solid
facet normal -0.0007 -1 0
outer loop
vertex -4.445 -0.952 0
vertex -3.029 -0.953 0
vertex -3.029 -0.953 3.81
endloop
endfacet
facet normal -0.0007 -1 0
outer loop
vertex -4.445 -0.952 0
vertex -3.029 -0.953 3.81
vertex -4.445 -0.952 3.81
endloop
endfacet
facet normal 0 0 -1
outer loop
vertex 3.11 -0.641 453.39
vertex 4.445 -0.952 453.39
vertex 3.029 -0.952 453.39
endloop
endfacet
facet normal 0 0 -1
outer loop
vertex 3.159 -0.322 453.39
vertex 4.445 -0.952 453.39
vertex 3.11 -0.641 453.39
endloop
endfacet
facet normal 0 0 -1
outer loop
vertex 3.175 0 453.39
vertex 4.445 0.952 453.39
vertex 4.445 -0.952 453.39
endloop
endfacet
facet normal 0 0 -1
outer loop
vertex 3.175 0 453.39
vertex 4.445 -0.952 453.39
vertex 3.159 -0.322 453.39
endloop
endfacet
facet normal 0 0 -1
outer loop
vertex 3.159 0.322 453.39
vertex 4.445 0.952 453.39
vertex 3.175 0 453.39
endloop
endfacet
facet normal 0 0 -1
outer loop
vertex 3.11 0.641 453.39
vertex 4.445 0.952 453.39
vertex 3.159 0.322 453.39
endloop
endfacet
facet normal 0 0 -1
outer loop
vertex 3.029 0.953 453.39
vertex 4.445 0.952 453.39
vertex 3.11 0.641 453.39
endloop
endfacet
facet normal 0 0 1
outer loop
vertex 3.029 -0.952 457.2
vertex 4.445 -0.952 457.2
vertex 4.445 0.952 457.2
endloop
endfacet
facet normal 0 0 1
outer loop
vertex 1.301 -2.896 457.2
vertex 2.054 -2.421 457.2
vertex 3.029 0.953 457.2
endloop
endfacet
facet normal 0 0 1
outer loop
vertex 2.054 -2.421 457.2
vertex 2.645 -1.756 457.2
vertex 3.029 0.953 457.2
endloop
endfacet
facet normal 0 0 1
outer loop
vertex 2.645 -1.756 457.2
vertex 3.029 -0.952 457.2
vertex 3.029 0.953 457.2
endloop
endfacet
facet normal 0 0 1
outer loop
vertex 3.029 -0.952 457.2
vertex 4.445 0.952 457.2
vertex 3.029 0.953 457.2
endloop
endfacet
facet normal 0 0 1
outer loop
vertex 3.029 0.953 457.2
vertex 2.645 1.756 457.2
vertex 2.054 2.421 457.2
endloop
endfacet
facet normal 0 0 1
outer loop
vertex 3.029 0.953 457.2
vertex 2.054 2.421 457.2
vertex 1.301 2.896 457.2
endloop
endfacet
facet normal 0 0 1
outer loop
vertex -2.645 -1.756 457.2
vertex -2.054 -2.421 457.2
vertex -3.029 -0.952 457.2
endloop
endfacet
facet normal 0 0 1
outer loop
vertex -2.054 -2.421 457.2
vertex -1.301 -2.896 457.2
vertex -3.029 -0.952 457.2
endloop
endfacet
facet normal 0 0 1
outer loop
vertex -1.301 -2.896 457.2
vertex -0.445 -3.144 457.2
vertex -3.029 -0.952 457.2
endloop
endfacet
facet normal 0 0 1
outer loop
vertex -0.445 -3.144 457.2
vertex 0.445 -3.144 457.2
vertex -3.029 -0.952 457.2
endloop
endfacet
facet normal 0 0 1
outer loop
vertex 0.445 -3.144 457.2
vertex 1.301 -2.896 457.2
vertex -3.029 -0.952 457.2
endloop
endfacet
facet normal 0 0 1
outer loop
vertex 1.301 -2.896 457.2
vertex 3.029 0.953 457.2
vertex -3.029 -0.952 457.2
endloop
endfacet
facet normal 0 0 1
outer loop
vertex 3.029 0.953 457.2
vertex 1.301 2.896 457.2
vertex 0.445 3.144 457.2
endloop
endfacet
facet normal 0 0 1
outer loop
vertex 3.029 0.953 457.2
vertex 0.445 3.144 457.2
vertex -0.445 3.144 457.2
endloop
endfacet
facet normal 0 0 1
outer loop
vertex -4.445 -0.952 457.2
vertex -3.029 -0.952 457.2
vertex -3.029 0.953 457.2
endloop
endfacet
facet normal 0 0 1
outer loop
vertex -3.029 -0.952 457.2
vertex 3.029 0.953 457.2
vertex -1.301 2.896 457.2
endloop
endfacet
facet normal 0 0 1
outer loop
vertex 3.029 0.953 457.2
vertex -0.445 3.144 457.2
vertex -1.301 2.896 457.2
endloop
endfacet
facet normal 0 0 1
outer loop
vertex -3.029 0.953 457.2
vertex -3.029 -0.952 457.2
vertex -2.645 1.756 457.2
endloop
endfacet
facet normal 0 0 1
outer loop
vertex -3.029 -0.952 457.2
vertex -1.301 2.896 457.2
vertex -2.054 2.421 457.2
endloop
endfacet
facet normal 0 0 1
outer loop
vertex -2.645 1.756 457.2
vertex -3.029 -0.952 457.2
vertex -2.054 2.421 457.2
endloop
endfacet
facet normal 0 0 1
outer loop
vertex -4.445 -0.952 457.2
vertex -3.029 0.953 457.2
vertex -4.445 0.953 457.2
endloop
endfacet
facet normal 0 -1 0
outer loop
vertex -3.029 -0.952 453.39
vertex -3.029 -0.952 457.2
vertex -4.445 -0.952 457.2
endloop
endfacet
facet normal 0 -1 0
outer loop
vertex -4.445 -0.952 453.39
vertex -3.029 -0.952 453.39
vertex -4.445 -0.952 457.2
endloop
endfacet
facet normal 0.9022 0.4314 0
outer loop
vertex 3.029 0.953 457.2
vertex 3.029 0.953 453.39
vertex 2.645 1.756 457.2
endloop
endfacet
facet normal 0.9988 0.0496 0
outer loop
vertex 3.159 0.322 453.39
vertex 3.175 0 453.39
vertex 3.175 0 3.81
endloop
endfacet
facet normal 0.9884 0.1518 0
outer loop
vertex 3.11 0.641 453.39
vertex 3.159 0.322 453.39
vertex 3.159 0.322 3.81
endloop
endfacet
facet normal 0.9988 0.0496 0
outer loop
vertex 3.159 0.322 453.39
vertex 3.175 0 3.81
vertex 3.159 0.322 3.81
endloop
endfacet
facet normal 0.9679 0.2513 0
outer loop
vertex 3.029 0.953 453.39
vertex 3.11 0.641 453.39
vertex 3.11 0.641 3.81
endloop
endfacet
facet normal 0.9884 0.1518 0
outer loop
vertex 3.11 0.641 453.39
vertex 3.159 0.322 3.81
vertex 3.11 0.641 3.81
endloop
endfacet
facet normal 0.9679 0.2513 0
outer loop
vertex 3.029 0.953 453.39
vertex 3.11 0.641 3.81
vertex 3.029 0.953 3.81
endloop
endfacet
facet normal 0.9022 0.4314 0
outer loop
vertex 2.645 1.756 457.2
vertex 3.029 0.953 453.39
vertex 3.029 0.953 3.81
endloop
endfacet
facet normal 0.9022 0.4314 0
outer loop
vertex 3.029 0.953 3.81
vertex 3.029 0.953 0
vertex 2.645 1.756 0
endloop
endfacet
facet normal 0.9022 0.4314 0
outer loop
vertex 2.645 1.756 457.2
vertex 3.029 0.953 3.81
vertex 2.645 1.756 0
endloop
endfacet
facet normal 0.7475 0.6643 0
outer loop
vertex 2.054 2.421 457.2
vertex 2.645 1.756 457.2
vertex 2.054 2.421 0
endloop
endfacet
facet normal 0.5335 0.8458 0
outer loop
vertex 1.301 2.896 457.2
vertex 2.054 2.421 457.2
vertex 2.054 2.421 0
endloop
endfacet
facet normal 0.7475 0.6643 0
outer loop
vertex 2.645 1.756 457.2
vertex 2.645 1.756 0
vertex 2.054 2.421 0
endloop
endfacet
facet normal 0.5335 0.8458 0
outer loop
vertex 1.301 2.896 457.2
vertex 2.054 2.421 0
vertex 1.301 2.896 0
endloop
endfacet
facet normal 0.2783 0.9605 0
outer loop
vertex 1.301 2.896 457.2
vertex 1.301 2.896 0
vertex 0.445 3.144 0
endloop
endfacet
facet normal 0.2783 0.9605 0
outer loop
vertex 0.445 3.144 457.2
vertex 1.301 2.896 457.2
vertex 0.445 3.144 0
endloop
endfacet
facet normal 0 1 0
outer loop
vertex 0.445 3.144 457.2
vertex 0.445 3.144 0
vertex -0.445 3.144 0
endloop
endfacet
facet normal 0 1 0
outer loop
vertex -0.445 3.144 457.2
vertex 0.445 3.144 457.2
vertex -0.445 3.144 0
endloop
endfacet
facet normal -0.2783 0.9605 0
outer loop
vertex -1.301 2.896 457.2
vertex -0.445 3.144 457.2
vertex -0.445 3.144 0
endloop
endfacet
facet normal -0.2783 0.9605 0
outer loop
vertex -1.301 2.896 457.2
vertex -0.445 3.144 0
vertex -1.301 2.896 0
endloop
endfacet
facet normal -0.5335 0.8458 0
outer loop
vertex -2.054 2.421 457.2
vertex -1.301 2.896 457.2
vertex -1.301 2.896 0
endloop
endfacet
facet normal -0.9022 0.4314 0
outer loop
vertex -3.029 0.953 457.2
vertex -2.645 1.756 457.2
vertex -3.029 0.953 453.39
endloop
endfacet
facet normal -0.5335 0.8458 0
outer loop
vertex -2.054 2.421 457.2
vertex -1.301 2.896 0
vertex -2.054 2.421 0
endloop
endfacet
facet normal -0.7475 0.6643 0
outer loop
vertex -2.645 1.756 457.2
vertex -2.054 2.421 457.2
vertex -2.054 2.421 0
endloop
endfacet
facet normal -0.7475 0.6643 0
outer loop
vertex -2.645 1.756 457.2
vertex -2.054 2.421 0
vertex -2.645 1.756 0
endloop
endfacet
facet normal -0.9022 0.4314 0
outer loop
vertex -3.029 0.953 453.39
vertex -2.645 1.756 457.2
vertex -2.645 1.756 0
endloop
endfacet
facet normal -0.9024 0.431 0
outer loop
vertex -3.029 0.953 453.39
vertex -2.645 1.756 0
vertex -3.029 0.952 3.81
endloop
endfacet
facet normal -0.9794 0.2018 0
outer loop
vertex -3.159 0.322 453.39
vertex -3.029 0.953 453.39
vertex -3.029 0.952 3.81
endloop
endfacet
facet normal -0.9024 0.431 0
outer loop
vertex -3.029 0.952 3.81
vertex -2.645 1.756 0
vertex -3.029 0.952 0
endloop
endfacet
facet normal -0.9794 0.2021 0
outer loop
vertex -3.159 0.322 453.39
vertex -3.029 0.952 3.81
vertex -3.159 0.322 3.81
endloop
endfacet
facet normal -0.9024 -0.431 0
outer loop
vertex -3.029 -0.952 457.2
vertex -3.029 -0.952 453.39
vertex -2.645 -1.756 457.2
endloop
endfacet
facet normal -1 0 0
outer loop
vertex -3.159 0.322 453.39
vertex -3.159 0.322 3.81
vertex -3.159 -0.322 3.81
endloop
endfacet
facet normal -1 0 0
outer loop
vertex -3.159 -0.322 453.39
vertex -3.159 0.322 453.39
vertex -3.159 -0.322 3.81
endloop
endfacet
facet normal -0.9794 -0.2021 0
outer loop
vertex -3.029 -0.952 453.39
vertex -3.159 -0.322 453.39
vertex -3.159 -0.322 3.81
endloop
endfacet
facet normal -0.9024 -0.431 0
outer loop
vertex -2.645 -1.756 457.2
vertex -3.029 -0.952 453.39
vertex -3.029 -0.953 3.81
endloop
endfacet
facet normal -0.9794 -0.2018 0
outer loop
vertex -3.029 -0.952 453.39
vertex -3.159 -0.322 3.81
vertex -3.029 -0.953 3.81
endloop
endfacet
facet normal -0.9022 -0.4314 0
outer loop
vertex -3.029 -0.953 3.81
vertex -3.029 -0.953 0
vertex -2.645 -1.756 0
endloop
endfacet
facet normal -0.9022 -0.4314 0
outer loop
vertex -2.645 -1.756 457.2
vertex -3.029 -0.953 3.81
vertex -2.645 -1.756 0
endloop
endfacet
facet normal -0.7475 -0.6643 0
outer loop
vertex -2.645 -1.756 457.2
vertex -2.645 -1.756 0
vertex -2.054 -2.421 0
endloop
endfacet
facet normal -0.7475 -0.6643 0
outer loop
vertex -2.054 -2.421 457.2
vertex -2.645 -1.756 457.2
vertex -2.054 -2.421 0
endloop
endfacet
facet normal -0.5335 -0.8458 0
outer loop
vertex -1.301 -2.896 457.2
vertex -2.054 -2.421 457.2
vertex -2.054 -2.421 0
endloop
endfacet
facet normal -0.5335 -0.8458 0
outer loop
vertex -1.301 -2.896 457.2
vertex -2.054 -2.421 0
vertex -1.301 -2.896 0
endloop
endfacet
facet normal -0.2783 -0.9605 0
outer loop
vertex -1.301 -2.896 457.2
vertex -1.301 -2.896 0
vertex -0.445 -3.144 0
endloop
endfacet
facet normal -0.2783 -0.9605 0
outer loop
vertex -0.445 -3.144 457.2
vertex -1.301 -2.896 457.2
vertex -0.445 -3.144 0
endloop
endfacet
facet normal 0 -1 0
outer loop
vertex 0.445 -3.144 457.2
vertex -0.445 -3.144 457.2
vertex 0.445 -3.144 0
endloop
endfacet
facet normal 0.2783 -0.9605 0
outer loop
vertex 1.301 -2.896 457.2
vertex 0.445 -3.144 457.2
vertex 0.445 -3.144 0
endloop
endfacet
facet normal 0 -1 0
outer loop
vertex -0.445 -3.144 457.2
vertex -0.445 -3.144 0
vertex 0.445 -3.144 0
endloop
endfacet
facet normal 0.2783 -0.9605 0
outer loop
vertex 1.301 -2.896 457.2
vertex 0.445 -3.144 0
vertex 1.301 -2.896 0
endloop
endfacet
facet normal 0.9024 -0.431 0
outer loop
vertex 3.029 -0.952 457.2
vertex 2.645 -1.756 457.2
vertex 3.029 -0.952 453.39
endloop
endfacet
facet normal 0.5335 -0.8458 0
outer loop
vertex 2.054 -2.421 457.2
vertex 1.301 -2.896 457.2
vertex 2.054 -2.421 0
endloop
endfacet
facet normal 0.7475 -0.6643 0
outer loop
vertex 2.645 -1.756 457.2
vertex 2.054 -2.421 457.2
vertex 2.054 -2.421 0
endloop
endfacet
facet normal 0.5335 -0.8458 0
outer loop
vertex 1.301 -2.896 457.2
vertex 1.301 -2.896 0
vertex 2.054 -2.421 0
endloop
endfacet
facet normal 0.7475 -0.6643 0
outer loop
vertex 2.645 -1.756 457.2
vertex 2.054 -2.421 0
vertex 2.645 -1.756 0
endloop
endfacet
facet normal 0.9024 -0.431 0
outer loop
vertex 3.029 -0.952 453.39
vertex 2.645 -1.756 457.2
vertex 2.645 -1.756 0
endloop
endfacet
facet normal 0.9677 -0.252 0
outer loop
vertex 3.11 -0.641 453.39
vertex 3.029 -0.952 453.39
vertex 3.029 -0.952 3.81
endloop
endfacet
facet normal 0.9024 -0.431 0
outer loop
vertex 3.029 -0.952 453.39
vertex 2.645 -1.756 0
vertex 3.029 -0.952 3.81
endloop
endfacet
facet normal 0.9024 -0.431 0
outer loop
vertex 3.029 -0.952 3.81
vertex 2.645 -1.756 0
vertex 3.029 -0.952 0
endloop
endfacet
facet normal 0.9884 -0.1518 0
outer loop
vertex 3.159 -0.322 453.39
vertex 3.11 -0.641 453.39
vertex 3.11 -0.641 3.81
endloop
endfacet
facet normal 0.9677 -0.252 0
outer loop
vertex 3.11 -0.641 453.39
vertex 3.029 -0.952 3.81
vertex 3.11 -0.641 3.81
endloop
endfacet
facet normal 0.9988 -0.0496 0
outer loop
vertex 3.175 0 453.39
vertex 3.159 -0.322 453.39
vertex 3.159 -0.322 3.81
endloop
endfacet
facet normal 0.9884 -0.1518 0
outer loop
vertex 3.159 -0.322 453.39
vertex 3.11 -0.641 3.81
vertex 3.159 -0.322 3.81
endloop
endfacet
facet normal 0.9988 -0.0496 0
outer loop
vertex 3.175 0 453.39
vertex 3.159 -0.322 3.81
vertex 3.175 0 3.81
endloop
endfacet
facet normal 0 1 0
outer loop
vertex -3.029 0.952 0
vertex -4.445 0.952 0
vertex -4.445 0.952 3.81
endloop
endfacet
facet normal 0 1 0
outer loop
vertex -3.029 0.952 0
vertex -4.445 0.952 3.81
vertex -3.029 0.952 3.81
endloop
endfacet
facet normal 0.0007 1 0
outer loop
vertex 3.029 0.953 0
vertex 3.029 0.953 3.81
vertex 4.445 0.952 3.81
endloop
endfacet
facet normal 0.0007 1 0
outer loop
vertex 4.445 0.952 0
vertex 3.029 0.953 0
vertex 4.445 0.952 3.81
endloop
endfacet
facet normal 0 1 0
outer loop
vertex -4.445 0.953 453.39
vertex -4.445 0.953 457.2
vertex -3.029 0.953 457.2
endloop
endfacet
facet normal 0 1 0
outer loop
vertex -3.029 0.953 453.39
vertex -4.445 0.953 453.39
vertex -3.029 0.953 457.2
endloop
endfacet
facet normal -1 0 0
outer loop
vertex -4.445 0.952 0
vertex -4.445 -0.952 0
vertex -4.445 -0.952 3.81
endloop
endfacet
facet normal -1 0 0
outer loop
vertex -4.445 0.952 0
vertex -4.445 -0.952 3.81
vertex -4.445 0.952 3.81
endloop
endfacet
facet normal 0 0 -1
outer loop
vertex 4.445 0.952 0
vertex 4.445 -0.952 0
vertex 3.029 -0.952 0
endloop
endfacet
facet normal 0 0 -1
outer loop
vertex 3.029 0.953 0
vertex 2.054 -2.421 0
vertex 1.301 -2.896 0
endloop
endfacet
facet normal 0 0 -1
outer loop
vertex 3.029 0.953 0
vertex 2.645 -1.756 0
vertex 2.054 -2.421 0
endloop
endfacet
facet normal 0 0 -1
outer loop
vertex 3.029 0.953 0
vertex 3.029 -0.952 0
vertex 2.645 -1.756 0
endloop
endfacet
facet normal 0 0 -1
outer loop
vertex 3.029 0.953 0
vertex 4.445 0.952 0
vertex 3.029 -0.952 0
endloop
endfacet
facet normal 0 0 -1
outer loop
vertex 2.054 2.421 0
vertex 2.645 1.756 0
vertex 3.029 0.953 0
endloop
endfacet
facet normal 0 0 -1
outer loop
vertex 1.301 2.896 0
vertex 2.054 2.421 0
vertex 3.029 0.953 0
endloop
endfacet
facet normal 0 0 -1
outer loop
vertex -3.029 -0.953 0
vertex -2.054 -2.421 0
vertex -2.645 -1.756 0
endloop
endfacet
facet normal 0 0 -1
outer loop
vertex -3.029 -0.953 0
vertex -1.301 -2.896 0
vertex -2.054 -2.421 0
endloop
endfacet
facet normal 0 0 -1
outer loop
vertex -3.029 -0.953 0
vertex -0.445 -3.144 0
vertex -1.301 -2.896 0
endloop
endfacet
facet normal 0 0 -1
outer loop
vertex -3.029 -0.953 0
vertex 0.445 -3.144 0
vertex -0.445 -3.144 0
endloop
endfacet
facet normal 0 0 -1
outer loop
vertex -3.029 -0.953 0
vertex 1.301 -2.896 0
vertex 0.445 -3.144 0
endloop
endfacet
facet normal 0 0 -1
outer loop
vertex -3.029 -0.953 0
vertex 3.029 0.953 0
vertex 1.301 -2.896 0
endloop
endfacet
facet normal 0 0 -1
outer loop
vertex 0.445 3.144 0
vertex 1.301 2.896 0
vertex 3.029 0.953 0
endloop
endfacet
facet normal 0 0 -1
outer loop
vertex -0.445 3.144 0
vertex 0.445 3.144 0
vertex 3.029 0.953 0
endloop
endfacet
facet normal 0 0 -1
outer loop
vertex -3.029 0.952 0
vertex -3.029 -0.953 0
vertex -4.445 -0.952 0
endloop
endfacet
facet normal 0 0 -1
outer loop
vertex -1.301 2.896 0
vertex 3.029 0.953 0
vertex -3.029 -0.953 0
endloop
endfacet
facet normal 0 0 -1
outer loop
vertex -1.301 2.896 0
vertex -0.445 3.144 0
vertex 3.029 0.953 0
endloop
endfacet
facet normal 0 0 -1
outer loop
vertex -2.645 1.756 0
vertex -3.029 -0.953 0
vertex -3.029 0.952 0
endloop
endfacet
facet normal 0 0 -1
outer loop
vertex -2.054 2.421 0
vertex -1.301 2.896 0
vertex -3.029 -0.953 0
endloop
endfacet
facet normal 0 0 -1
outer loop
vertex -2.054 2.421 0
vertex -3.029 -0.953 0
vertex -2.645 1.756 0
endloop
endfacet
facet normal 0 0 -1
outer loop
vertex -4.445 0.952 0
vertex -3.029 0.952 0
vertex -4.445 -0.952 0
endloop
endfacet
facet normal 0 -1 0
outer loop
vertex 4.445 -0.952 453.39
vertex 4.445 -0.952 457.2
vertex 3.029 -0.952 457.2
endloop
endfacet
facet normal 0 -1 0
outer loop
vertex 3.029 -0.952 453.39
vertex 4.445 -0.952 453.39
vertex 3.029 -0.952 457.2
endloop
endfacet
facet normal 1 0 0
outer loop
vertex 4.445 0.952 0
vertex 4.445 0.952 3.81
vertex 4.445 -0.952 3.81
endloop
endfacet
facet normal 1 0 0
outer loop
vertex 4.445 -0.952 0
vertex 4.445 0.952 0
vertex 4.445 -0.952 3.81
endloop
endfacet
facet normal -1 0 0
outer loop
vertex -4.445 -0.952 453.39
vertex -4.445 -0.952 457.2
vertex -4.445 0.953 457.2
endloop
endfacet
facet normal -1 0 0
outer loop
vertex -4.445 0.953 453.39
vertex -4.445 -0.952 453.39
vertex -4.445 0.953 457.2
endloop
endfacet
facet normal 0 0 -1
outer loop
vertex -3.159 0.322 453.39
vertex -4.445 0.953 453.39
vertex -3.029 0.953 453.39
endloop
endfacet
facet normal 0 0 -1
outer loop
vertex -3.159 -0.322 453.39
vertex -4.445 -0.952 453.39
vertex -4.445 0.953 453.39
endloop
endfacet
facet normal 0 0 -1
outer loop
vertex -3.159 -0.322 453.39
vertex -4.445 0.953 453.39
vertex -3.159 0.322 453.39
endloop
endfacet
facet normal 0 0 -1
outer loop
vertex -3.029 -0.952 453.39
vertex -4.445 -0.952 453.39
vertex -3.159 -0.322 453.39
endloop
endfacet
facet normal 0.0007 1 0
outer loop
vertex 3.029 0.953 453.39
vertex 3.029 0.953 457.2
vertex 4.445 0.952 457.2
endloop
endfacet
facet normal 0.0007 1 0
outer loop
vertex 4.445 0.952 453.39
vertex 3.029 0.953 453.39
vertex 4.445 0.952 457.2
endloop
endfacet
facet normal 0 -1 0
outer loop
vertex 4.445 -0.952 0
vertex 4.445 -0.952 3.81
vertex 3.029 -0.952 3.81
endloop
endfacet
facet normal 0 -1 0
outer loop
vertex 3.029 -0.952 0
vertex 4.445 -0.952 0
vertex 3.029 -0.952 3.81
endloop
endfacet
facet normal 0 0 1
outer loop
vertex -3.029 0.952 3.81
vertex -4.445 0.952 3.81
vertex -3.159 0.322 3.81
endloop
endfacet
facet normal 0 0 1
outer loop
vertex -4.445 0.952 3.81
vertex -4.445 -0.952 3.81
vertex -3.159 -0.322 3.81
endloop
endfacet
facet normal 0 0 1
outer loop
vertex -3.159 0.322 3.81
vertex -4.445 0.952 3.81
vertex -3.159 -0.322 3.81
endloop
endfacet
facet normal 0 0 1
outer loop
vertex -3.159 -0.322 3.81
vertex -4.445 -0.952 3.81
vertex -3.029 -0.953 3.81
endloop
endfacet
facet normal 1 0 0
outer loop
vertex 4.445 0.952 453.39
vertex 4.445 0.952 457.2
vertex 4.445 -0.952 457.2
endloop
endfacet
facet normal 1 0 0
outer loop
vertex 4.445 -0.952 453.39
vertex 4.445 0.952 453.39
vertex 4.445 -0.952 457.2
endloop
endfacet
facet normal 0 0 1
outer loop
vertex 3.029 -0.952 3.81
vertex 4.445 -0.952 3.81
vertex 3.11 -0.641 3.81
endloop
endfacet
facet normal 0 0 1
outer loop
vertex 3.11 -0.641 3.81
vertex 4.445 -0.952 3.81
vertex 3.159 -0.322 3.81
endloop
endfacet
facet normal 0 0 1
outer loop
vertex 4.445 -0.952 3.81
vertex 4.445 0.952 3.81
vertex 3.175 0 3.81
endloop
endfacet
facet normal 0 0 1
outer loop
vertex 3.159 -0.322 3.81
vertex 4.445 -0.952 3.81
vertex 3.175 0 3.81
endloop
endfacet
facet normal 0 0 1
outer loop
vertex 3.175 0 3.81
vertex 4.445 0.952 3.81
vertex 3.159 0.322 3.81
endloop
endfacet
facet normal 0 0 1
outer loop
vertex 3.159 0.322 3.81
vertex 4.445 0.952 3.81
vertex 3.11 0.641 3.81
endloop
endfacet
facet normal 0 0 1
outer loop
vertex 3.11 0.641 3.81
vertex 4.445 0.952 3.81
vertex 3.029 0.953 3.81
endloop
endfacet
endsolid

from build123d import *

# Parameters (mm, degrees)
SKETCH1_R              = 3.175
BOSS_EXTRUDE1_DEPTH    = 457.2
BOSS_EXTRUDE2_START    = -3.81
BOSS_EXTRUDE2_DEPTH    = 3.81
CIRPATTERN1_COUNT      = 2
LPATTERN1_COUNT        = 2
LPATTERN1_PITCH        = 453.39
LPATTERN1_START        = -3.81
LPATTERN1_COPY_1_DEPTH = 3.81


with BuildPart() as part:
    # Sketch1 → Boss-Extrude1 (new body)
    with BuildSketch(Plane.XY):
        Circle(SKETCH1_R)
    extrude(amount=BOSS_EXTRUDE1_DEPTH)

    # Sketch3 → Boss-Extrude2 (add)
    with BuildSketch(Plane.XY.offset(457.2).offset(BOSS_EXTRUDE2_START)):
        with BuildLine():
            Line((4.445, 0.9525), (4.445, -0.9525))
            Line((4.445, -0.9525), (3.028756964, -0.9525))
            ThreePointArc((3.028756964, -0.9525), (3.175, 0), (3.028756964, 0.9525))
            Line((3.028756964, 0.9525), (4.445, 0.9525))
        make_face()
    boss_extrude2 = extrude(amount=BOSS_EXTRUDE2_DEPTH)

    # CirPattern1: Boss-Extrude2 ×2 about axis
    cirpattern1_axis = Axis((0, 0, 0), (0, 0, 1))
    for i in range(1, CIRPATTERN1_COUNT):
        add(boss_extrude2.rotate(cirpattern1_axis, i * 360 / CIRPATTERN1_COUNT))

    # LPattern1: Boss-Extrude2 ×2
    with Locations(*[(0, 0, -i * LPATTERN1_PITCH) for i in range(1, LPATTERN1_COUNT)]):
        add(boss_extrude2)

    # LPattern1 copy 1 sketch → LPattern1 copy 1 (add)
    with BuildSketch(Plane(origin=(0, 0, 3.81), x_dir=(-1, 0, 0), z_dir=(0, 0, 1)).offset(LPATTERN1_START)):
        with BuildLine():
            Line((4.445, 0.9525), (4.445, -0.9525))
            Line((4.445, -0.9525), (3.028756964, -0.9525))
            ThreePointArc((3.028756964, -0.9525), (3.175, 0), (3.028756964, 0.9525))
            Line((3.028756964, 0.9525), (4.445, 0.9525))
        make_face()
    extrude(amount=LPATTERN1_COPY_1_DEPTH)


solid = part.part
